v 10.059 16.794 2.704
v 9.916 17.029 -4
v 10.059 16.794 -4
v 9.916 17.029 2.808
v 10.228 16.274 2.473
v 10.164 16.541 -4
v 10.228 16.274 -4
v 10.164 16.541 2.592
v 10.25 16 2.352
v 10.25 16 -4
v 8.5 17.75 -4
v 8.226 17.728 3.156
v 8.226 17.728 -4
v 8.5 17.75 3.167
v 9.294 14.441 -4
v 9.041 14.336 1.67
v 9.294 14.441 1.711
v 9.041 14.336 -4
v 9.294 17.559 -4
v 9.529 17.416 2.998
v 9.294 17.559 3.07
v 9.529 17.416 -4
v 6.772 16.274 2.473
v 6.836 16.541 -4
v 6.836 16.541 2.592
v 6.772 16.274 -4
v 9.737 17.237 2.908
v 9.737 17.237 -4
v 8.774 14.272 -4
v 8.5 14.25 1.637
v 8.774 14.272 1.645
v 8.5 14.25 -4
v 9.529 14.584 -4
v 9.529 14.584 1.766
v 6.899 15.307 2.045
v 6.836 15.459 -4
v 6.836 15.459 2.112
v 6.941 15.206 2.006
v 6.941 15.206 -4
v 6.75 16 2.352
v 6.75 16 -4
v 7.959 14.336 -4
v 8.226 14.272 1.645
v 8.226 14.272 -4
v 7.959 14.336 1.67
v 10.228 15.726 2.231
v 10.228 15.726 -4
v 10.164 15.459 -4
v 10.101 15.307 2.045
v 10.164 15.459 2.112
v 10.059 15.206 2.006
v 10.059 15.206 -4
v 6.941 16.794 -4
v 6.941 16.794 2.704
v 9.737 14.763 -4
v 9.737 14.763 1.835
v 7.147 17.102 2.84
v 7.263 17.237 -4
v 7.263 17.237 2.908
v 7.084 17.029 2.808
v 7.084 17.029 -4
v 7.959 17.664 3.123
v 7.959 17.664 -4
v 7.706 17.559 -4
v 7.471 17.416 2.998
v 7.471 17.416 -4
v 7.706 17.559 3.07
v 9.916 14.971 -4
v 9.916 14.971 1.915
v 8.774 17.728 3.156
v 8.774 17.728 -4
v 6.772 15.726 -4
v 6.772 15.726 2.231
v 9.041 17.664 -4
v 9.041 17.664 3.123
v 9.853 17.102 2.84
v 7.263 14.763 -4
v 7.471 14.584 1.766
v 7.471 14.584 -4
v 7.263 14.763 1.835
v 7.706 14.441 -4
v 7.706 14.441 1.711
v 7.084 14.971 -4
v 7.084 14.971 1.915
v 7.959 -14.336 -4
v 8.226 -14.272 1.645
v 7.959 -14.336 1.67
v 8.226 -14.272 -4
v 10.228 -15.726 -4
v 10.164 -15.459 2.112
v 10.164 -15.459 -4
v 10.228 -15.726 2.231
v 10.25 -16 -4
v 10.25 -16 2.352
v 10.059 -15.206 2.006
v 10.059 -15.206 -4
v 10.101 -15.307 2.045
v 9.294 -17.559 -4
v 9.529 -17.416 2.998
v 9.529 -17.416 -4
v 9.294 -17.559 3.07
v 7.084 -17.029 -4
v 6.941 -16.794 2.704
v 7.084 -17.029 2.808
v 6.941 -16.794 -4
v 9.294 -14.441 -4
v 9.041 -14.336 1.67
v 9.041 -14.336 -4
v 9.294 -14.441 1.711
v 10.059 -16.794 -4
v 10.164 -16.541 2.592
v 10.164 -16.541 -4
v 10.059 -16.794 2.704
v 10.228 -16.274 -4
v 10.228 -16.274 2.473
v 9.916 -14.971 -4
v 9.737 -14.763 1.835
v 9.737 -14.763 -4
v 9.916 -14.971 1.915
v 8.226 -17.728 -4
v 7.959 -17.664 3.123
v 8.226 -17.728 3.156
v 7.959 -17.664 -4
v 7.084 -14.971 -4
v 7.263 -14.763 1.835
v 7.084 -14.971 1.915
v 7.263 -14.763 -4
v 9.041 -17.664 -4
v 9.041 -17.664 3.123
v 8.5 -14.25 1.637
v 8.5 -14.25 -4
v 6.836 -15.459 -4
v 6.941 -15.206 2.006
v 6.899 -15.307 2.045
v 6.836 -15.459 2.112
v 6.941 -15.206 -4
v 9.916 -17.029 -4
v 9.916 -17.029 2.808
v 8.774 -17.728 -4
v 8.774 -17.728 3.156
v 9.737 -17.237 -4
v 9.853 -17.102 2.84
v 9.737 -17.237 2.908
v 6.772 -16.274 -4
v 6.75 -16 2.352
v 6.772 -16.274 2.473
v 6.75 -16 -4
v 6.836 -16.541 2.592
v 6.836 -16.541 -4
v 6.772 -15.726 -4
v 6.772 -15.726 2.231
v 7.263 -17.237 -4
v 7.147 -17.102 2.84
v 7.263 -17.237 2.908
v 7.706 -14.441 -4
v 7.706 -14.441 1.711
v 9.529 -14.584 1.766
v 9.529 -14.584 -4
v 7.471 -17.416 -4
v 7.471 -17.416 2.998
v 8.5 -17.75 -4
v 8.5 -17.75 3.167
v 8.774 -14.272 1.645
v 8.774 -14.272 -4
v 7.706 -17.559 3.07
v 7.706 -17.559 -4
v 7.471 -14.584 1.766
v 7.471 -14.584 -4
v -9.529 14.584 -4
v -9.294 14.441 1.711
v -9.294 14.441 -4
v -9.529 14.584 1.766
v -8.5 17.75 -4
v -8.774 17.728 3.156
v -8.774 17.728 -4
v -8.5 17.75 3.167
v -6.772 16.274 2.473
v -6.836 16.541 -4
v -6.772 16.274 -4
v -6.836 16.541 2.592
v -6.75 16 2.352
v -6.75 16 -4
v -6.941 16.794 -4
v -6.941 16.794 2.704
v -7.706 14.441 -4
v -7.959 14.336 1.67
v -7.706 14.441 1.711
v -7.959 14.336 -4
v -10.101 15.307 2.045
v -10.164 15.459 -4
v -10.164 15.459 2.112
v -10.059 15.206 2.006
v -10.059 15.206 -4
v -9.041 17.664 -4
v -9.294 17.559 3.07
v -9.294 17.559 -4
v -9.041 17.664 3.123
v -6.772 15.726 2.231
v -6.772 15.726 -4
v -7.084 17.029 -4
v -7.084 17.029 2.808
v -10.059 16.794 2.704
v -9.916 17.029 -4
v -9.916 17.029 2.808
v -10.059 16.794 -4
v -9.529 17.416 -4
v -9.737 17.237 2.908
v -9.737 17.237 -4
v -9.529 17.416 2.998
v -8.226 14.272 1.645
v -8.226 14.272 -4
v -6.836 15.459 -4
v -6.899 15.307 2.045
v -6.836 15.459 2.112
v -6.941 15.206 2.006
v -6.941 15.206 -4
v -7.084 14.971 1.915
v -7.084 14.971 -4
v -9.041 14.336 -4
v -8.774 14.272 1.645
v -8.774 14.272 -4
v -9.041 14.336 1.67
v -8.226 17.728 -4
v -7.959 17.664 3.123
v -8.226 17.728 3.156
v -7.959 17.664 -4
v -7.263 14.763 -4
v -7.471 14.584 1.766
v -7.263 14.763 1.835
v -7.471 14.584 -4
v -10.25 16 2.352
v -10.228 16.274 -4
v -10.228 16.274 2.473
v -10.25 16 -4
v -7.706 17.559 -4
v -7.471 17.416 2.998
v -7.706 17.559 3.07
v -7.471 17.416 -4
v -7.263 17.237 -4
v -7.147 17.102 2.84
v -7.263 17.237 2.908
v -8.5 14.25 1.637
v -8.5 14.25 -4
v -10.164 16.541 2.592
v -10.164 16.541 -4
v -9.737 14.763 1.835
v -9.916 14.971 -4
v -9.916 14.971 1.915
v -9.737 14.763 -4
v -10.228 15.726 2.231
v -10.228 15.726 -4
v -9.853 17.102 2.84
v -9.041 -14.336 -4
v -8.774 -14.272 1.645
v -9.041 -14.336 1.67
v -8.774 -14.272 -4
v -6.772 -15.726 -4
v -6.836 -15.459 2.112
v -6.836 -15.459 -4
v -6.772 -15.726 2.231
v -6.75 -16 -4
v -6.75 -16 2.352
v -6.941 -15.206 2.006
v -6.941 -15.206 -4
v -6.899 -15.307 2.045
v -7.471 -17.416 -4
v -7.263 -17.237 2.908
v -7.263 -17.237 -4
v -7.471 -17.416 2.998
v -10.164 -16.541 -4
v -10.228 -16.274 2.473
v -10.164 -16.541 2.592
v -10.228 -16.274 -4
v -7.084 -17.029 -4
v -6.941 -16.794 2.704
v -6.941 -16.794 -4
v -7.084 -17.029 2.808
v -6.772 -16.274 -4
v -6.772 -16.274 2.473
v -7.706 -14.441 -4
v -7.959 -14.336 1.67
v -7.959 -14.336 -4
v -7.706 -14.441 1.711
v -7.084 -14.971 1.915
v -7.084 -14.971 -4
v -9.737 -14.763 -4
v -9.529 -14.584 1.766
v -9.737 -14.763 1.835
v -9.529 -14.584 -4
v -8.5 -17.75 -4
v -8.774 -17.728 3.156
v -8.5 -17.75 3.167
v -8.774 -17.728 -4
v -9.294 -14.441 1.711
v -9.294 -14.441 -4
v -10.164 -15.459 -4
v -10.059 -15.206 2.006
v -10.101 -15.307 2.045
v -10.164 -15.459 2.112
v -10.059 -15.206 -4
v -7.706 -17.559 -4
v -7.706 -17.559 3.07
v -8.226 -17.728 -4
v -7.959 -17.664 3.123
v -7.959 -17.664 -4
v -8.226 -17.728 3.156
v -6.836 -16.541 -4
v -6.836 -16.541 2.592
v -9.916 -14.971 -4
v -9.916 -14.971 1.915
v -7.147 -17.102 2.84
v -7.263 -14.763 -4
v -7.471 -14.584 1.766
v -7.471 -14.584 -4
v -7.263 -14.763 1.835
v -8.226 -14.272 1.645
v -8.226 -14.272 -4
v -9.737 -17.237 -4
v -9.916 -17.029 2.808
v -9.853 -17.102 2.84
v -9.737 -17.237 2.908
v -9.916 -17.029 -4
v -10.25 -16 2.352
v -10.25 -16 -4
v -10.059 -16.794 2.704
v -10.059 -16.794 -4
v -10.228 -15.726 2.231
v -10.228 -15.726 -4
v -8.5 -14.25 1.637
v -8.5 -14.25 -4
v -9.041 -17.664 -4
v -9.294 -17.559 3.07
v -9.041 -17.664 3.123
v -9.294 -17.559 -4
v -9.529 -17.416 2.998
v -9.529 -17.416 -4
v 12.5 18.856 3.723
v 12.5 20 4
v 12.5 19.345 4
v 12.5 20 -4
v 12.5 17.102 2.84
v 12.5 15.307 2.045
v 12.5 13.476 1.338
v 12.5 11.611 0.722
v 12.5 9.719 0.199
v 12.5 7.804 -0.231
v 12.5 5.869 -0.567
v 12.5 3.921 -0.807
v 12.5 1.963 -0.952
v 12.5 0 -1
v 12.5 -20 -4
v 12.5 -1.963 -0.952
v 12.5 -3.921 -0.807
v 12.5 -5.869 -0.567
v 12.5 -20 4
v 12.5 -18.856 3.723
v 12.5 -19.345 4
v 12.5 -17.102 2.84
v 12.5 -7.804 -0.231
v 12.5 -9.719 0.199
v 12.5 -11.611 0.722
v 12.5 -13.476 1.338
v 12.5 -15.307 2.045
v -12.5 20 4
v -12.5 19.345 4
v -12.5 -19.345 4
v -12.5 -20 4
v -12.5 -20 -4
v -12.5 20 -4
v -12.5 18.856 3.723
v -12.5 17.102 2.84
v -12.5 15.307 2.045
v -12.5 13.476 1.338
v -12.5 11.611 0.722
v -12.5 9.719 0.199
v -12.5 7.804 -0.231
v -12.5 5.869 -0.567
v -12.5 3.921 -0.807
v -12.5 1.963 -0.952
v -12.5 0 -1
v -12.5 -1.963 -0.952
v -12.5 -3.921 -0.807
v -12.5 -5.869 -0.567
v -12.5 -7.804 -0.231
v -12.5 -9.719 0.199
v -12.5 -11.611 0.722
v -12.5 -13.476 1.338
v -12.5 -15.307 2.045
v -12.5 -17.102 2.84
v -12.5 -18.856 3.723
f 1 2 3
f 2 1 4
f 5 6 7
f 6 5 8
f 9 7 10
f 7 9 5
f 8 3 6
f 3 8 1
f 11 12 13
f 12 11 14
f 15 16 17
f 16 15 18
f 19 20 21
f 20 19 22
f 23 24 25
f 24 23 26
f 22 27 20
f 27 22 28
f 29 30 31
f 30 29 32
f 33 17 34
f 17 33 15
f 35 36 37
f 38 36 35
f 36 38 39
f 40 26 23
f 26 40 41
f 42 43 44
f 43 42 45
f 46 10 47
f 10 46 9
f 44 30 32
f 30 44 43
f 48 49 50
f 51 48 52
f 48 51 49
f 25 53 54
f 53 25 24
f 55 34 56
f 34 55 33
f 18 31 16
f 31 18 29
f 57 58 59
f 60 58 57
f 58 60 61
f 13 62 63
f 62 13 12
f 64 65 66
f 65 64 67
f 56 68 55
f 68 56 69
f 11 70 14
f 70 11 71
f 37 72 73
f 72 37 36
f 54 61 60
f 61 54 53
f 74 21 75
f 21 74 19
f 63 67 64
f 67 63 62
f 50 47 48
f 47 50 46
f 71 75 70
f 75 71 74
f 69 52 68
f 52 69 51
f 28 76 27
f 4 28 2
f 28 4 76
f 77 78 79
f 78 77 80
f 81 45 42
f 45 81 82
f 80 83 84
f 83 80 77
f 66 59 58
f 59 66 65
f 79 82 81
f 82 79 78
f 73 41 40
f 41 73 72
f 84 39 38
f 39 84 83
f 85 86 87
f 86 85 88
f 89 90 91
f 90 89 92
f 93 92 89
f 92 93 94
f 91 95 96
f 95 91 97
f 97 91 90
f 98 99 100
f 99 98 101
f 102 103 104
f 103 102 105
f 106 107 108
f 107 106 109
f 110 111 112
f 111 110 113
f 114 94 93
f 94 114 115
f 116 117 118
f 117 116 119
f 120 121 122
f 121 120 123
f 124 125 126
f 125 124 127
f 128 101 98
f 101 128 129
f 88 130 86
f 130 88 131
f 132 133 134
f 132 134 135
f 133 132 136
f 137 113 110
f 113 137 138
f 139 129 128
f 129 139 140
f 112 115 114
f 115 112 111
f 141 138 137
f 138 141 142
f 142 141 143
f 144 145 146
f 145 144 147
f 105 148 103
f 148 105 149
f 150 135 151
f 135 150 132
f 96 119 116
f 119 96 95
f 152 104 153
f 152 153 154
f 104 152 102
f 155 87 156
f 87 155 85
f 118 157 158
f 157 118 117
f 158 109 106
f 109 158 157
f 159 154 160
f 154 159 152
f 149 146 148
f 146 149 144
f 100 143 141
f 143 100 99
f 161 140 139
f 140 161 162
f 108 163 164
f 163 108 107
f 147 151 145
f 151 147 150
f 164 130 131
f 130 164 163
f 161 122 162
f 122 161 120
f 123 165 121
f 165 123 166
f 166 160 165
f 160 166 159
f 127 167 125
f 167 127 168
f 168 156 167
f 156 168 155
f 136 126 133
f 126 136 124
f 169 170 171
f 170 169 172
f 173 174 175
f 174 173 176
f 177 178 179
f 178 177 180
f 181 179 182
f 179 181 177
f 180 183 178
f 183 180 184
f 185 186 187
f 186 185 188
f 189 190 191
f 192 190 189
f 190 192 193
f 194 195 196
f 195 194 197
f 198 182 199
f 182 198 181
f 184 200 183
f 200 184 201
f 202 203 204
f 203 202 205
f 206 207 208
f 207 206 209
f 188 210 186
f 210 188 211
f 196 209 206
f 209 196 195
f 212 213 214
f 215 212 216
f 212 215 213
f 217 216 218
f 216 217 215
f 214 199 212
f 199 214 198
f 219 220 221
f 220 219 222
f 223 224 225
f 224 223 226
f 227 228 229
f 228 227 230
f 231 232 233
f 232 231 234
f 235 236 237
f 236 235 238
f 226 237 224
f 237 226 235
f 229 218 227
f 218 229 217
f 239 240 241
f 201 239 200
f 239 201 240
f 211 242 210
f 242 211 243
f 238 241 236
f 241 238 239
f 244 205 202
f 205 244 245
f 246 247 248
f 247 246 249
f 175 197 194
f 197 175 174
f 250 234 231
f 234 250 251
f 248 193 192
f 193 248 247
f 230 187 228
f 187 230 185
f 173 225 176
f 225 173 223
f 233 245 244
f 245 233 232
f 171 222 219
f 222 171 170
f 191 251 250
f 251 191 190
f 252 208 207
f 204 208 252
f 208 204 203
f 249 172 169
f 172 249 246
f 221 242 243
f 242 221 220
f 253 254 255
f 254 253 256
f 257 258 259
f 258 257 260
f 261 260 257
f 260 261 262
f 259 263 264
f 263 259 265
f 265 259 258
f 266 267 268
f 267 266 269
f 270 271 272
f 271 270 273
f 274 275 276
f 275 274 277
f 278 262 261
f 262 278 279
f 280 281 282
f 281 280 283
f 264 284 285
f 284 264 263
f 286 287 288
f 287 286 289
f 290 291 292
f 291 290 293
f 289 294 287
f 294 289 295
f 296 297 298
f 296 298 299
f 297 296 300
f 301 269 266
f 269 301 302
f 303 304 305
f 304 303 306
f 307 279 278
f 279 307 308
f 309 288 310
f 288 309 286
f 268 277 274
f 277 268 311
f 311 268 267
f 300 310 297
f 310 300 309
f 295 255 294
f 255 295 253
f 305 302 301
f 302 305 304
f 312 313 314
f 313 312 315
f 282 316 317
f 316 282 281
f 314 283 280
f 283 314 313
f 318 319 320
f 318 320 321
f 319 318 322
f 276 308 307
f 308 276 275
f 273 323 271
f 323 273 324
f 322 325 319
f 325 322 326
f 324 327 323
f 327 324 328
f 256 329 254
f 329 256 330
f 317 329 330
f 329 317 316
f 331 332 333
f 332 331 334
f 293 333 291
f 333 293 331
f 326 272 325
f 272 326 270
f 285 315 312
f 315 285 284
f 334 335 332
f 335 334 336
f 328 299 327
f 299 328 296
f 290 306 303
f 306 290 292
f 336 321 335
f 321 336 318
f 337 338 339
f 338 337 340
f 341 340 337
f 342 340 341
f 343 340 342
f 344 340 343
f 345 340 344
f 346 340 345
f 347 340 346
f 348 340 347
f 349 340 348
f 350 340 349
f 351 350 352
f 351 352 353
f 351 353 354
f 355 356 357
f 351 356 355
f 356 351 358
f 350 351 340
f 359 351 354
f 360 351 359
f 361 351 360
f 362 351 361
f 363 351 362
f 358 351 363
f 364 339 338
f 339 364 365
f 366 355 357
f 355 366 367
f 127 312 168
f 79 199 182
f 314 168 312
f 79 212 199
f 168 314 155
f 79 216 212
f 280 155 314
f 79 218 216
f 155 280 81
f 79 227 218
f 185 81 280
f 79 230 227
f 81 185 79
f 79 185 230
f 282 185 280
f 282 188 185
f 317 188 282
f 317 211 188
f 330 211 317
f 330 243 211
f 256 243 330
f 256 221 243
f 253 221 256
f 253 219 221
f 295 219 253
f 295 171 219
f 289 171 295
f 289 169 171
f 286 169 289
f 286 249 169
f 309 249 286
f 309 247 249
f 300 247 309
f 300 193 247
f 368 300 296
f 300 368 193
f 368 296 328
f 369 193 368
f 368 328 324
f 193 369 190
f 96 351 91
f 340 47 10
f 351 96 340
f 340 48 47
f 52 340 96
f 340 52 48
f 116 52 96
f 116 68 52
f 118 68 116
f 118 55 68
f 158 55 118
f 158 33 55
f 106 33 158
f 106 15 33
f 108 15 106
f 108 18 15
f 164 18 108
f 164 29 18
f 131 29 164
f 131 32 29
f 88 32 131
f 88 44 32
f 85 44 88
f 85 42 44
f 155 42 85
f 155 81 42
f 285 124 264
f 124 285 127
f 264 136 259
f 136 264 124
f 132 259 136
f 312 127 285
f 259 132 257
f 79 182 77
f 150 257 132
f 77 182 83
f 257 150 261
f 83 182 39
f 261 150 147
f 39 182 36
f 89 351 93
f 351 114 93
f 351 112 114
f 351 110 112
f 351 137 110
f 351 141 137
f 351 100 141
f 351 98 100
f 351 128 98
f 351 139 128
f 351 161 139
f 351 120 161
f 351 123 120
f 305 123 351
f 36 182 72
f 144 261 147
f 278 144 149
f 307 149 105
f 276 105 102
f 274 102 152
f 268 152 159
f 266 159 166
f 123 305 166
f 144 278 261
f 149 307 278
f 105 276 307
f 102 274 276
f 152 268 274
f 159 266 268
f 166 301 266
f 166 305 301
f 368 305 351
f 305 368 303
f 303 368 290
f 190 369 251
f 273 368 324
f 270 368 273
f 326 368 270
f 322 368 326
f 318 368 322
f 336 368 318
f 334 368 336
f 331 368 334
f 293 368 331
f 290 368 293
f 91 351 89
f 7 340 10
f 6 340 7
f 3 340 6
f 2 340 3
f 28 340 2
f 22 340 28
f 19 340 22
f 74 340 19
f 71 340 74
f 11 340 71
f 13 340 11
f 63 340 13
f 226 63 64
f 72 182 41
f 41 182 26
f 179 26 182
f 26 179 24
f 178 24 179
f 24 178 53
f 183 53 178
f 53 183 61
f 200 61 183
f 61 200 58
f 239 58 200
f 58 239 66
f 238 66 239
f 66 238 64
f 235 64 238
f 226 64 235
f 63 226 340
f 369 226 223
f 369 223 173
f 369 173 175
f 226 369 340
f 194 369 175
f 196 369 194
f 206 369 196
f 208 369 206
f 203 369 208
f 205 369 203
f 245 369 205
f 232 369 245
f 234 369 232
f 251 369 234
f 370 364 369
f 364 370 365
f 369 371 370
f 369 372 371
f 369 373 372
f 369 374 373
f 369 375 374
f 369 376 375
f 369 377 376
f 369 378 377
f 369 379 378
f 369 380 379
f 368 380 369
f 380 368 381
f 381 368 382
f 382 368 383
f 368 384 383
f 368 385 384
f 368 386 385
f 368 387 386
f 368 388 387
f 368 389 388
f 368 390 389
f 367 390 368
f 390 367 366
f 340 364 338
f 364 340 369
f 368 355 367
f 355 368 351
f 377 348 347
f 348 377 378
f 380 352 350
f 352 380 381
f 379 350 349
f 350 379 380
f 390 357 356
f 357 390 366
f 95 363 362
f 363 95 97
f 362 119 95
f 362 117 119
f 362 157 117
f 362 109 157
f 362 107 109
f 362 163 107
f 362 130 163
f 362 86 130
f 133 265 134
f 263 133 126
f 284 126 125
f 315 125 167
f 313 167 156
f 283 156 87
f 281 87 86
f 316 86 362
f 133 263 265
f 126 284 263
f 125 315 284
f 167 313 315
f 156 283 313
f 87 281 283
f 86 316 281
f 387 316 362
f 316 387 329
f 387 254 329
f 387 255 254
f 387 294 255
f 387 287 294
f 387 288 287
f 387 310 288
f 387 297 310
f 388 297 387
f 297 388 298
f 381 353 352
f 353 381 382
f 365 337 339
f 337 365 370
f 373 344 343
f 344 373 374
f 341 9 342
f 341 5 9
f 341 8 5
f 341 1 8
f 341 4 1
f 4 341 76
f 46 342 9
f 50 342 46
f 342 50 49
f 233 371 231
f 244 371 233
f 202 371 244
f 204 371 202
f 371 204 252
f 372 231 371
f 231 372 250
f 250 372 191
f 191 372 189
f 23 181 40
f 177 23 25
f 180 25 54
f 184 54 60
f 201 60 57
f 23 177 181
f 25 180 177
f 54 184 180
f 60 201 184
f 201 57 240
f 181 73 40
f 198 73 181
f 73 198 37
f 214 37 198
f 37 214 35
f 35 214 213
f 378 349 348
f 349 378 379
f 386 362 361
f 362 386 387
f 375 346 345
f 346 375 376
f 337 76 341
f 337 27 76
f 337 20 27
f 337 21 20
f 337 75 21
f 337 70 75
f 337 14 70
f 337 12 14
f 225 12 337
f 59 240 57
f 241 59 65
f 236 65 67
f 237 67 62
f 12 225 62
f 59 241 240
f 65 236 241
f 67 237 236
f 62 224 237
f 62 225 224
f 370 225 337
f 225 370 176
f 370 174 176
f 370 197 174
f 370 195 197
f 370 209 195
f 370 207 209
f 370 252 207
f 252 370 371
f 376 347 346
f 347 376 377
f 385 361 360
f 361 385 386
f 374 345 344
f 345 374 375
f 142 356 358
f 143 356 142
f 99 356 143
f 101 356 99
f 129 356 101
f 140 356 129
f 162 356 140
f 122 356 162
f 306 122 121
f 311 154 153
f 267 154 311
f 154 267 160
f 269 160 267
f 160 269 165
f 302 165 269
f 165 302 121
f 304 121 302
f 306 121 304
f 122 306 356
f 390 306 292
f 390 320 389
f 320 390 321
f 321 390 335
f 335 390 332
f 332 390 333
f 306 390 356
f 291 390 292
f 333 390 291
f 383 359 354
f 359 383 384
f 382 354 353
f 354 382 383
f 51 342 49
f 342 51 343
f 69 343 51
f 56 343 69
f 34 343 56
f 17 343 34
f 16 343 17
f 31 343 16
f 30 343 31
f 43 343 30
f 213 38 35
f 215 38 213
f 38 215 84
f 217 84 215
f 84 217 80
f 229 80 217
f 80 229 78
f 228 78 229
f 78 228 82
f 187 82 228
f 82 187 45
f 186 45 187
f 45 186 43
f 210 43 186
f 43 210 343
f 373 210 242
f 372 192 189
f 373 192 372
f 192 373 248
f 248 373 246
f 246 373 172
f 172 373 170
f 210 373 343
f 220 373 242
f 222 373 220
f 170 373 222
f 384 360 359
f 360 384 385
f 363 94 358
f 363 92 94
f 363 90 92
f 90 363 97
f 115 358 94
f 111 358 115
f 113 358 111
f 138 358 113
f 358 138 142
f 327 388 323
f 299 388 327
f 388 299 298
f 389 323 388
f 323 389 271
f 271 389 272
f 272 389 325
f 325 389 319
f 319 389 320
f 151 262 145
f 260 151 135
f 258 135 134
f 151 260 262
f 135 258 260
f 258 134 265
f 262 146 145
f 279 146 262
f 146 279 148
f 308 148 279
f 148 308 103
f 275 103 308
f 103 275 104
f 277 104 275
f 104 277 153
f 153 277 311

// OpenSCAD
// file: microGearMotorMount.scad
//===============================
//
//  No-tools micro motor mounts
//
//  Designed by Andrew Moore, May 2016
//      http://www.thingiverse.com/TacPar
//
//      For questions, suggestions, or whatever, 
//      please PM me through thingiverse.
//
//      This work is licensed under a Creative Commons 
//      Attribution-ShareAlike 4.0 International License.
//      http://creativecommons.org/licenses/by-sa/4.0/
//
//  This can be used with a variety of 12mm micro gear motors
//  Length dimensions may need to change to accomodate 
//  different gear ratios (particularly the Pololu 
//  1000:1 motors)
//
//  This design allows for a little slop in motor 
//  position.  You can always tighten that up with 
//  some shim stock after you insert the motor.
//
//  The mounting holes are arbitrarily set based on the plate dimensions
//  This could be improved.
//
//  If you use an encoder, you may have to solder it to the back of the 
//  motor after inserting the motor into the holder.
//===============================



//this is motor length without the gearbox
motor_length = 15;
//dimension for rounded sides on micro motor
motor_width = 12; 	
//flat sides on micro motor
motor_height = 10;
//length of the gear box not including the output shaft
gearbox_length = 10;

//wall thickness for the motor holder before tolerance losses
housing_thickness = 3;

//this defines how oversized the hole is for the motor
//this will reduce the effective housing thickness above
tolerance = 0.25;

plate_width = 40;

plate_length = motor_length+gearbox_length;

module MicroGearMotorMount(
  plate_thickness = 3
)
{
	//backplate()
	difference()
	{
		positives();
		negatives();
	}
	//add ons in areas that were erased...
	
	//back plate
	translate([plate_length/2-motor_length/2,0,-(motor_height/2+plate_thickness/2)]) BackPlate(plate_thickness);

	module positives()
	{
		//motor holding ring
		rotate([0,90,0]) 
            translate([0,0,0]) 
            cylinder(r=motor_width/2+housing_thickness, h=motor_length, center=true, $fn=40);

		translate([0,0,-motor_height/2+plate_thickness]) 
            cube([motor_length,motor_width+2*housing_thickness,motor_height-plate_thickness], center=true);

	}

	module negatives()
	{
		//cut off cylinder below the mounting plate
		translate([0,0,-(motor_height/2+plate_thickness-0.01)]) 
            cube([100,100,2*plate_thickness], center=true);

		//keyed shaft
		rotate([0,90,0]) 
        translate([0,0,-motor_length/2-0.1]) keyshaft(); 
        //translate([0,0,-motor_height/4]) cube([motor_length+.1,motor_width+1,motor_height/2], center=true);
		
	}
    module keyshaft()
    {
        difference()
		{
			positives();
            negatives();
            
			
		}
        module positives()
        {
            cylinder(r=motor_width/2+tolerance, h=motor_length+1, $fn=50);
        }
        
        module negatives()
        {
            translate([-motor_height-tolerance,0,motor_length/2+tolerance]) cube([motor_height,motor_width,motor_length+2],center=true);
            translate([motor_height+tolerance,0,motor_length/2+tolerance]) cube([motor_height,motor_width,motor_length+2],center=true);
        }
    }
  }


module BackPlate(plate_thickness=3,tab=true,screw_radius=1.75)
	{
      tab_height = plate_thickness+2;
      tab_width = 5;
      tab_thickness = 1.5;

      difference()
      {
        positives();
        negatives();
      }
        
      module positives()
      {
          cube([plate_length,plate_width,plate_thickness],center=true);
      }
      module negatives()
      {
          mount_holes();
        if (tab) {tab_slots();}
      }
        
      module mount_holes()
      {
        rotate([0,0,0]) 
                  translate([plate_length/2-4,plate_width/2-4,0]) 
                  cylinder(r=screw_radius, h=plate_thickness+1, $fn=40, center=true);
        rotate([0,0,0])
                  translate([plate_length/2-4,-(plate_width/2-4),0]) 
                  cylinder(r=screw_radius, h=plate_thickness+1, $fn=40, center=true);
        rotate([0,0,0])
                  translate([-(plate_length/2-4),plate_width/2-4,0]) 
                  cylinder(r=screw_radius, h=plate_thickness+1, $fn=40, center=true);
        rotate([0,0,0])
                  translate([-(plate_length/2-4),-(plate_width/2-4),0]) 
                  cylinder(r=screw_radius, h=plate_thickness+1, $fn=40, center=true);
        
      }
      
      module tab_slots()
      {
        translate([0.4*plate_length,tab_width/2, 0]) cube([plate_length,1,plate_thickness+1], center=true);
        translate([0.4*plate_length,-tab_width/2, 0]) cube([plate_length,1,plate_thickness+1], center=true);
        
        // If the tongue needs to be thinner
        translate([0.4*plate_length,0, -plate_thickness/2]) cube([plate_length,tab_width,2], center=true);
      }
	

	   //gearbox tab ... stops motor from sliding forward
      if (tab)
      {
        translate([plate_length/2+tab_thickness/2,0,(tab_height-plate_thickness)/2]) cube([tab_thickness,tab_width,tab_height], center=true);
      }
}

MicroGearMotorMount();
// main file
use <microGearMotorMount.scad>


//this is motor length without the gearbox
motor_length = 15;
//dimension for rounded sides on micro motor
motor_width = 12; 	
//flat sides on micro motor
motor_height = 10;
//length of the gear box not including the output shaft
gearbox_length = 10;

//wall thickness for the motor holder before tolerance losses
housing_thickness = 3;

//this defines how oversized the hole is for the motor
//this will reduce the effective housing thickness above
tolerance = 0.25;

plate_width = 40;

plate_length = motor_length+gearbox_length;

low_thickness=3;
original_thickness=5;

plate_thickness=low_thickness+original_thickness;
screw_radius=1.75;
corner_radius=40;

sqr2=1.4142;
cube_side = plate_width/sqr2;

difference() {

rotate([0,0,0])BackPlate(plate_thickness=plate_thickness, tab=false, screw_radius=screw_radius);


rotate([0,0,0]) CornerDent(plate_length,plate_width,corner_radius,plate_thickness);
//translate([0,0,plate_thickness])rotate([0,0,0])mount_holes();
}



module CornerDent(length,width,corner_radius, plate_thickness)
{
translate([0,0,(corner_radius)-plate_thickness/2+low_thickness])
rotate([0,90,0])
{
//difference () {
  cylinder(r=corner_radius,h=length, center=true, $fn=128);
//  translate([corner_radius-(corner_radius*sqr2/2),0,0])cube([2*corner_radius,2*corner_radius,length],center=true);
//}
}
}
module Corner(length,width,corner_radius, plate_thickness)
{
translate([0,0,-(corner_radius*sqr2/2)+plate_thickness/2])
rotate([0,90,0])
{
difference () {
  cylinder(r=corner_radius,h=length, center=true, $fn=128);
  translate([corner_radius-(corner_radius*sqr2/2),0,0])cube([2*corner_radius,2*corner_radius,length],center=true);
}
}
}

      module mount_holes()
      {
        rotate([0,0,0]) 
                  translate([plate_length/2-4,plate_width/2-4,0]) 
                  cylinder(r=screw_radius, h=plate_thickness+1, $fn=40, center=true);
        rotate([0,0,0])
                  translate([plate_length/2-4,-(plate_width/2-4),0]) 
                  cylinder(r=screw_radius, h=plate_thickness+1, $fn=40, center=true);
        rotate([0,0,0])
                  translate([-(plate_length/2-4),plate_width/2-4,0]) 
                  cylinder(r=screw_radius, h=plate_thickness+1, $fn=40, center=true);
        rotate([0,0,0])
                  translate([-(plate_length/2-4),-(plate_width/2-4),0]) 
                  cylinder(r=screw_radius, h=plate_thickness+1, $fn=40, center=true);
        
      }
